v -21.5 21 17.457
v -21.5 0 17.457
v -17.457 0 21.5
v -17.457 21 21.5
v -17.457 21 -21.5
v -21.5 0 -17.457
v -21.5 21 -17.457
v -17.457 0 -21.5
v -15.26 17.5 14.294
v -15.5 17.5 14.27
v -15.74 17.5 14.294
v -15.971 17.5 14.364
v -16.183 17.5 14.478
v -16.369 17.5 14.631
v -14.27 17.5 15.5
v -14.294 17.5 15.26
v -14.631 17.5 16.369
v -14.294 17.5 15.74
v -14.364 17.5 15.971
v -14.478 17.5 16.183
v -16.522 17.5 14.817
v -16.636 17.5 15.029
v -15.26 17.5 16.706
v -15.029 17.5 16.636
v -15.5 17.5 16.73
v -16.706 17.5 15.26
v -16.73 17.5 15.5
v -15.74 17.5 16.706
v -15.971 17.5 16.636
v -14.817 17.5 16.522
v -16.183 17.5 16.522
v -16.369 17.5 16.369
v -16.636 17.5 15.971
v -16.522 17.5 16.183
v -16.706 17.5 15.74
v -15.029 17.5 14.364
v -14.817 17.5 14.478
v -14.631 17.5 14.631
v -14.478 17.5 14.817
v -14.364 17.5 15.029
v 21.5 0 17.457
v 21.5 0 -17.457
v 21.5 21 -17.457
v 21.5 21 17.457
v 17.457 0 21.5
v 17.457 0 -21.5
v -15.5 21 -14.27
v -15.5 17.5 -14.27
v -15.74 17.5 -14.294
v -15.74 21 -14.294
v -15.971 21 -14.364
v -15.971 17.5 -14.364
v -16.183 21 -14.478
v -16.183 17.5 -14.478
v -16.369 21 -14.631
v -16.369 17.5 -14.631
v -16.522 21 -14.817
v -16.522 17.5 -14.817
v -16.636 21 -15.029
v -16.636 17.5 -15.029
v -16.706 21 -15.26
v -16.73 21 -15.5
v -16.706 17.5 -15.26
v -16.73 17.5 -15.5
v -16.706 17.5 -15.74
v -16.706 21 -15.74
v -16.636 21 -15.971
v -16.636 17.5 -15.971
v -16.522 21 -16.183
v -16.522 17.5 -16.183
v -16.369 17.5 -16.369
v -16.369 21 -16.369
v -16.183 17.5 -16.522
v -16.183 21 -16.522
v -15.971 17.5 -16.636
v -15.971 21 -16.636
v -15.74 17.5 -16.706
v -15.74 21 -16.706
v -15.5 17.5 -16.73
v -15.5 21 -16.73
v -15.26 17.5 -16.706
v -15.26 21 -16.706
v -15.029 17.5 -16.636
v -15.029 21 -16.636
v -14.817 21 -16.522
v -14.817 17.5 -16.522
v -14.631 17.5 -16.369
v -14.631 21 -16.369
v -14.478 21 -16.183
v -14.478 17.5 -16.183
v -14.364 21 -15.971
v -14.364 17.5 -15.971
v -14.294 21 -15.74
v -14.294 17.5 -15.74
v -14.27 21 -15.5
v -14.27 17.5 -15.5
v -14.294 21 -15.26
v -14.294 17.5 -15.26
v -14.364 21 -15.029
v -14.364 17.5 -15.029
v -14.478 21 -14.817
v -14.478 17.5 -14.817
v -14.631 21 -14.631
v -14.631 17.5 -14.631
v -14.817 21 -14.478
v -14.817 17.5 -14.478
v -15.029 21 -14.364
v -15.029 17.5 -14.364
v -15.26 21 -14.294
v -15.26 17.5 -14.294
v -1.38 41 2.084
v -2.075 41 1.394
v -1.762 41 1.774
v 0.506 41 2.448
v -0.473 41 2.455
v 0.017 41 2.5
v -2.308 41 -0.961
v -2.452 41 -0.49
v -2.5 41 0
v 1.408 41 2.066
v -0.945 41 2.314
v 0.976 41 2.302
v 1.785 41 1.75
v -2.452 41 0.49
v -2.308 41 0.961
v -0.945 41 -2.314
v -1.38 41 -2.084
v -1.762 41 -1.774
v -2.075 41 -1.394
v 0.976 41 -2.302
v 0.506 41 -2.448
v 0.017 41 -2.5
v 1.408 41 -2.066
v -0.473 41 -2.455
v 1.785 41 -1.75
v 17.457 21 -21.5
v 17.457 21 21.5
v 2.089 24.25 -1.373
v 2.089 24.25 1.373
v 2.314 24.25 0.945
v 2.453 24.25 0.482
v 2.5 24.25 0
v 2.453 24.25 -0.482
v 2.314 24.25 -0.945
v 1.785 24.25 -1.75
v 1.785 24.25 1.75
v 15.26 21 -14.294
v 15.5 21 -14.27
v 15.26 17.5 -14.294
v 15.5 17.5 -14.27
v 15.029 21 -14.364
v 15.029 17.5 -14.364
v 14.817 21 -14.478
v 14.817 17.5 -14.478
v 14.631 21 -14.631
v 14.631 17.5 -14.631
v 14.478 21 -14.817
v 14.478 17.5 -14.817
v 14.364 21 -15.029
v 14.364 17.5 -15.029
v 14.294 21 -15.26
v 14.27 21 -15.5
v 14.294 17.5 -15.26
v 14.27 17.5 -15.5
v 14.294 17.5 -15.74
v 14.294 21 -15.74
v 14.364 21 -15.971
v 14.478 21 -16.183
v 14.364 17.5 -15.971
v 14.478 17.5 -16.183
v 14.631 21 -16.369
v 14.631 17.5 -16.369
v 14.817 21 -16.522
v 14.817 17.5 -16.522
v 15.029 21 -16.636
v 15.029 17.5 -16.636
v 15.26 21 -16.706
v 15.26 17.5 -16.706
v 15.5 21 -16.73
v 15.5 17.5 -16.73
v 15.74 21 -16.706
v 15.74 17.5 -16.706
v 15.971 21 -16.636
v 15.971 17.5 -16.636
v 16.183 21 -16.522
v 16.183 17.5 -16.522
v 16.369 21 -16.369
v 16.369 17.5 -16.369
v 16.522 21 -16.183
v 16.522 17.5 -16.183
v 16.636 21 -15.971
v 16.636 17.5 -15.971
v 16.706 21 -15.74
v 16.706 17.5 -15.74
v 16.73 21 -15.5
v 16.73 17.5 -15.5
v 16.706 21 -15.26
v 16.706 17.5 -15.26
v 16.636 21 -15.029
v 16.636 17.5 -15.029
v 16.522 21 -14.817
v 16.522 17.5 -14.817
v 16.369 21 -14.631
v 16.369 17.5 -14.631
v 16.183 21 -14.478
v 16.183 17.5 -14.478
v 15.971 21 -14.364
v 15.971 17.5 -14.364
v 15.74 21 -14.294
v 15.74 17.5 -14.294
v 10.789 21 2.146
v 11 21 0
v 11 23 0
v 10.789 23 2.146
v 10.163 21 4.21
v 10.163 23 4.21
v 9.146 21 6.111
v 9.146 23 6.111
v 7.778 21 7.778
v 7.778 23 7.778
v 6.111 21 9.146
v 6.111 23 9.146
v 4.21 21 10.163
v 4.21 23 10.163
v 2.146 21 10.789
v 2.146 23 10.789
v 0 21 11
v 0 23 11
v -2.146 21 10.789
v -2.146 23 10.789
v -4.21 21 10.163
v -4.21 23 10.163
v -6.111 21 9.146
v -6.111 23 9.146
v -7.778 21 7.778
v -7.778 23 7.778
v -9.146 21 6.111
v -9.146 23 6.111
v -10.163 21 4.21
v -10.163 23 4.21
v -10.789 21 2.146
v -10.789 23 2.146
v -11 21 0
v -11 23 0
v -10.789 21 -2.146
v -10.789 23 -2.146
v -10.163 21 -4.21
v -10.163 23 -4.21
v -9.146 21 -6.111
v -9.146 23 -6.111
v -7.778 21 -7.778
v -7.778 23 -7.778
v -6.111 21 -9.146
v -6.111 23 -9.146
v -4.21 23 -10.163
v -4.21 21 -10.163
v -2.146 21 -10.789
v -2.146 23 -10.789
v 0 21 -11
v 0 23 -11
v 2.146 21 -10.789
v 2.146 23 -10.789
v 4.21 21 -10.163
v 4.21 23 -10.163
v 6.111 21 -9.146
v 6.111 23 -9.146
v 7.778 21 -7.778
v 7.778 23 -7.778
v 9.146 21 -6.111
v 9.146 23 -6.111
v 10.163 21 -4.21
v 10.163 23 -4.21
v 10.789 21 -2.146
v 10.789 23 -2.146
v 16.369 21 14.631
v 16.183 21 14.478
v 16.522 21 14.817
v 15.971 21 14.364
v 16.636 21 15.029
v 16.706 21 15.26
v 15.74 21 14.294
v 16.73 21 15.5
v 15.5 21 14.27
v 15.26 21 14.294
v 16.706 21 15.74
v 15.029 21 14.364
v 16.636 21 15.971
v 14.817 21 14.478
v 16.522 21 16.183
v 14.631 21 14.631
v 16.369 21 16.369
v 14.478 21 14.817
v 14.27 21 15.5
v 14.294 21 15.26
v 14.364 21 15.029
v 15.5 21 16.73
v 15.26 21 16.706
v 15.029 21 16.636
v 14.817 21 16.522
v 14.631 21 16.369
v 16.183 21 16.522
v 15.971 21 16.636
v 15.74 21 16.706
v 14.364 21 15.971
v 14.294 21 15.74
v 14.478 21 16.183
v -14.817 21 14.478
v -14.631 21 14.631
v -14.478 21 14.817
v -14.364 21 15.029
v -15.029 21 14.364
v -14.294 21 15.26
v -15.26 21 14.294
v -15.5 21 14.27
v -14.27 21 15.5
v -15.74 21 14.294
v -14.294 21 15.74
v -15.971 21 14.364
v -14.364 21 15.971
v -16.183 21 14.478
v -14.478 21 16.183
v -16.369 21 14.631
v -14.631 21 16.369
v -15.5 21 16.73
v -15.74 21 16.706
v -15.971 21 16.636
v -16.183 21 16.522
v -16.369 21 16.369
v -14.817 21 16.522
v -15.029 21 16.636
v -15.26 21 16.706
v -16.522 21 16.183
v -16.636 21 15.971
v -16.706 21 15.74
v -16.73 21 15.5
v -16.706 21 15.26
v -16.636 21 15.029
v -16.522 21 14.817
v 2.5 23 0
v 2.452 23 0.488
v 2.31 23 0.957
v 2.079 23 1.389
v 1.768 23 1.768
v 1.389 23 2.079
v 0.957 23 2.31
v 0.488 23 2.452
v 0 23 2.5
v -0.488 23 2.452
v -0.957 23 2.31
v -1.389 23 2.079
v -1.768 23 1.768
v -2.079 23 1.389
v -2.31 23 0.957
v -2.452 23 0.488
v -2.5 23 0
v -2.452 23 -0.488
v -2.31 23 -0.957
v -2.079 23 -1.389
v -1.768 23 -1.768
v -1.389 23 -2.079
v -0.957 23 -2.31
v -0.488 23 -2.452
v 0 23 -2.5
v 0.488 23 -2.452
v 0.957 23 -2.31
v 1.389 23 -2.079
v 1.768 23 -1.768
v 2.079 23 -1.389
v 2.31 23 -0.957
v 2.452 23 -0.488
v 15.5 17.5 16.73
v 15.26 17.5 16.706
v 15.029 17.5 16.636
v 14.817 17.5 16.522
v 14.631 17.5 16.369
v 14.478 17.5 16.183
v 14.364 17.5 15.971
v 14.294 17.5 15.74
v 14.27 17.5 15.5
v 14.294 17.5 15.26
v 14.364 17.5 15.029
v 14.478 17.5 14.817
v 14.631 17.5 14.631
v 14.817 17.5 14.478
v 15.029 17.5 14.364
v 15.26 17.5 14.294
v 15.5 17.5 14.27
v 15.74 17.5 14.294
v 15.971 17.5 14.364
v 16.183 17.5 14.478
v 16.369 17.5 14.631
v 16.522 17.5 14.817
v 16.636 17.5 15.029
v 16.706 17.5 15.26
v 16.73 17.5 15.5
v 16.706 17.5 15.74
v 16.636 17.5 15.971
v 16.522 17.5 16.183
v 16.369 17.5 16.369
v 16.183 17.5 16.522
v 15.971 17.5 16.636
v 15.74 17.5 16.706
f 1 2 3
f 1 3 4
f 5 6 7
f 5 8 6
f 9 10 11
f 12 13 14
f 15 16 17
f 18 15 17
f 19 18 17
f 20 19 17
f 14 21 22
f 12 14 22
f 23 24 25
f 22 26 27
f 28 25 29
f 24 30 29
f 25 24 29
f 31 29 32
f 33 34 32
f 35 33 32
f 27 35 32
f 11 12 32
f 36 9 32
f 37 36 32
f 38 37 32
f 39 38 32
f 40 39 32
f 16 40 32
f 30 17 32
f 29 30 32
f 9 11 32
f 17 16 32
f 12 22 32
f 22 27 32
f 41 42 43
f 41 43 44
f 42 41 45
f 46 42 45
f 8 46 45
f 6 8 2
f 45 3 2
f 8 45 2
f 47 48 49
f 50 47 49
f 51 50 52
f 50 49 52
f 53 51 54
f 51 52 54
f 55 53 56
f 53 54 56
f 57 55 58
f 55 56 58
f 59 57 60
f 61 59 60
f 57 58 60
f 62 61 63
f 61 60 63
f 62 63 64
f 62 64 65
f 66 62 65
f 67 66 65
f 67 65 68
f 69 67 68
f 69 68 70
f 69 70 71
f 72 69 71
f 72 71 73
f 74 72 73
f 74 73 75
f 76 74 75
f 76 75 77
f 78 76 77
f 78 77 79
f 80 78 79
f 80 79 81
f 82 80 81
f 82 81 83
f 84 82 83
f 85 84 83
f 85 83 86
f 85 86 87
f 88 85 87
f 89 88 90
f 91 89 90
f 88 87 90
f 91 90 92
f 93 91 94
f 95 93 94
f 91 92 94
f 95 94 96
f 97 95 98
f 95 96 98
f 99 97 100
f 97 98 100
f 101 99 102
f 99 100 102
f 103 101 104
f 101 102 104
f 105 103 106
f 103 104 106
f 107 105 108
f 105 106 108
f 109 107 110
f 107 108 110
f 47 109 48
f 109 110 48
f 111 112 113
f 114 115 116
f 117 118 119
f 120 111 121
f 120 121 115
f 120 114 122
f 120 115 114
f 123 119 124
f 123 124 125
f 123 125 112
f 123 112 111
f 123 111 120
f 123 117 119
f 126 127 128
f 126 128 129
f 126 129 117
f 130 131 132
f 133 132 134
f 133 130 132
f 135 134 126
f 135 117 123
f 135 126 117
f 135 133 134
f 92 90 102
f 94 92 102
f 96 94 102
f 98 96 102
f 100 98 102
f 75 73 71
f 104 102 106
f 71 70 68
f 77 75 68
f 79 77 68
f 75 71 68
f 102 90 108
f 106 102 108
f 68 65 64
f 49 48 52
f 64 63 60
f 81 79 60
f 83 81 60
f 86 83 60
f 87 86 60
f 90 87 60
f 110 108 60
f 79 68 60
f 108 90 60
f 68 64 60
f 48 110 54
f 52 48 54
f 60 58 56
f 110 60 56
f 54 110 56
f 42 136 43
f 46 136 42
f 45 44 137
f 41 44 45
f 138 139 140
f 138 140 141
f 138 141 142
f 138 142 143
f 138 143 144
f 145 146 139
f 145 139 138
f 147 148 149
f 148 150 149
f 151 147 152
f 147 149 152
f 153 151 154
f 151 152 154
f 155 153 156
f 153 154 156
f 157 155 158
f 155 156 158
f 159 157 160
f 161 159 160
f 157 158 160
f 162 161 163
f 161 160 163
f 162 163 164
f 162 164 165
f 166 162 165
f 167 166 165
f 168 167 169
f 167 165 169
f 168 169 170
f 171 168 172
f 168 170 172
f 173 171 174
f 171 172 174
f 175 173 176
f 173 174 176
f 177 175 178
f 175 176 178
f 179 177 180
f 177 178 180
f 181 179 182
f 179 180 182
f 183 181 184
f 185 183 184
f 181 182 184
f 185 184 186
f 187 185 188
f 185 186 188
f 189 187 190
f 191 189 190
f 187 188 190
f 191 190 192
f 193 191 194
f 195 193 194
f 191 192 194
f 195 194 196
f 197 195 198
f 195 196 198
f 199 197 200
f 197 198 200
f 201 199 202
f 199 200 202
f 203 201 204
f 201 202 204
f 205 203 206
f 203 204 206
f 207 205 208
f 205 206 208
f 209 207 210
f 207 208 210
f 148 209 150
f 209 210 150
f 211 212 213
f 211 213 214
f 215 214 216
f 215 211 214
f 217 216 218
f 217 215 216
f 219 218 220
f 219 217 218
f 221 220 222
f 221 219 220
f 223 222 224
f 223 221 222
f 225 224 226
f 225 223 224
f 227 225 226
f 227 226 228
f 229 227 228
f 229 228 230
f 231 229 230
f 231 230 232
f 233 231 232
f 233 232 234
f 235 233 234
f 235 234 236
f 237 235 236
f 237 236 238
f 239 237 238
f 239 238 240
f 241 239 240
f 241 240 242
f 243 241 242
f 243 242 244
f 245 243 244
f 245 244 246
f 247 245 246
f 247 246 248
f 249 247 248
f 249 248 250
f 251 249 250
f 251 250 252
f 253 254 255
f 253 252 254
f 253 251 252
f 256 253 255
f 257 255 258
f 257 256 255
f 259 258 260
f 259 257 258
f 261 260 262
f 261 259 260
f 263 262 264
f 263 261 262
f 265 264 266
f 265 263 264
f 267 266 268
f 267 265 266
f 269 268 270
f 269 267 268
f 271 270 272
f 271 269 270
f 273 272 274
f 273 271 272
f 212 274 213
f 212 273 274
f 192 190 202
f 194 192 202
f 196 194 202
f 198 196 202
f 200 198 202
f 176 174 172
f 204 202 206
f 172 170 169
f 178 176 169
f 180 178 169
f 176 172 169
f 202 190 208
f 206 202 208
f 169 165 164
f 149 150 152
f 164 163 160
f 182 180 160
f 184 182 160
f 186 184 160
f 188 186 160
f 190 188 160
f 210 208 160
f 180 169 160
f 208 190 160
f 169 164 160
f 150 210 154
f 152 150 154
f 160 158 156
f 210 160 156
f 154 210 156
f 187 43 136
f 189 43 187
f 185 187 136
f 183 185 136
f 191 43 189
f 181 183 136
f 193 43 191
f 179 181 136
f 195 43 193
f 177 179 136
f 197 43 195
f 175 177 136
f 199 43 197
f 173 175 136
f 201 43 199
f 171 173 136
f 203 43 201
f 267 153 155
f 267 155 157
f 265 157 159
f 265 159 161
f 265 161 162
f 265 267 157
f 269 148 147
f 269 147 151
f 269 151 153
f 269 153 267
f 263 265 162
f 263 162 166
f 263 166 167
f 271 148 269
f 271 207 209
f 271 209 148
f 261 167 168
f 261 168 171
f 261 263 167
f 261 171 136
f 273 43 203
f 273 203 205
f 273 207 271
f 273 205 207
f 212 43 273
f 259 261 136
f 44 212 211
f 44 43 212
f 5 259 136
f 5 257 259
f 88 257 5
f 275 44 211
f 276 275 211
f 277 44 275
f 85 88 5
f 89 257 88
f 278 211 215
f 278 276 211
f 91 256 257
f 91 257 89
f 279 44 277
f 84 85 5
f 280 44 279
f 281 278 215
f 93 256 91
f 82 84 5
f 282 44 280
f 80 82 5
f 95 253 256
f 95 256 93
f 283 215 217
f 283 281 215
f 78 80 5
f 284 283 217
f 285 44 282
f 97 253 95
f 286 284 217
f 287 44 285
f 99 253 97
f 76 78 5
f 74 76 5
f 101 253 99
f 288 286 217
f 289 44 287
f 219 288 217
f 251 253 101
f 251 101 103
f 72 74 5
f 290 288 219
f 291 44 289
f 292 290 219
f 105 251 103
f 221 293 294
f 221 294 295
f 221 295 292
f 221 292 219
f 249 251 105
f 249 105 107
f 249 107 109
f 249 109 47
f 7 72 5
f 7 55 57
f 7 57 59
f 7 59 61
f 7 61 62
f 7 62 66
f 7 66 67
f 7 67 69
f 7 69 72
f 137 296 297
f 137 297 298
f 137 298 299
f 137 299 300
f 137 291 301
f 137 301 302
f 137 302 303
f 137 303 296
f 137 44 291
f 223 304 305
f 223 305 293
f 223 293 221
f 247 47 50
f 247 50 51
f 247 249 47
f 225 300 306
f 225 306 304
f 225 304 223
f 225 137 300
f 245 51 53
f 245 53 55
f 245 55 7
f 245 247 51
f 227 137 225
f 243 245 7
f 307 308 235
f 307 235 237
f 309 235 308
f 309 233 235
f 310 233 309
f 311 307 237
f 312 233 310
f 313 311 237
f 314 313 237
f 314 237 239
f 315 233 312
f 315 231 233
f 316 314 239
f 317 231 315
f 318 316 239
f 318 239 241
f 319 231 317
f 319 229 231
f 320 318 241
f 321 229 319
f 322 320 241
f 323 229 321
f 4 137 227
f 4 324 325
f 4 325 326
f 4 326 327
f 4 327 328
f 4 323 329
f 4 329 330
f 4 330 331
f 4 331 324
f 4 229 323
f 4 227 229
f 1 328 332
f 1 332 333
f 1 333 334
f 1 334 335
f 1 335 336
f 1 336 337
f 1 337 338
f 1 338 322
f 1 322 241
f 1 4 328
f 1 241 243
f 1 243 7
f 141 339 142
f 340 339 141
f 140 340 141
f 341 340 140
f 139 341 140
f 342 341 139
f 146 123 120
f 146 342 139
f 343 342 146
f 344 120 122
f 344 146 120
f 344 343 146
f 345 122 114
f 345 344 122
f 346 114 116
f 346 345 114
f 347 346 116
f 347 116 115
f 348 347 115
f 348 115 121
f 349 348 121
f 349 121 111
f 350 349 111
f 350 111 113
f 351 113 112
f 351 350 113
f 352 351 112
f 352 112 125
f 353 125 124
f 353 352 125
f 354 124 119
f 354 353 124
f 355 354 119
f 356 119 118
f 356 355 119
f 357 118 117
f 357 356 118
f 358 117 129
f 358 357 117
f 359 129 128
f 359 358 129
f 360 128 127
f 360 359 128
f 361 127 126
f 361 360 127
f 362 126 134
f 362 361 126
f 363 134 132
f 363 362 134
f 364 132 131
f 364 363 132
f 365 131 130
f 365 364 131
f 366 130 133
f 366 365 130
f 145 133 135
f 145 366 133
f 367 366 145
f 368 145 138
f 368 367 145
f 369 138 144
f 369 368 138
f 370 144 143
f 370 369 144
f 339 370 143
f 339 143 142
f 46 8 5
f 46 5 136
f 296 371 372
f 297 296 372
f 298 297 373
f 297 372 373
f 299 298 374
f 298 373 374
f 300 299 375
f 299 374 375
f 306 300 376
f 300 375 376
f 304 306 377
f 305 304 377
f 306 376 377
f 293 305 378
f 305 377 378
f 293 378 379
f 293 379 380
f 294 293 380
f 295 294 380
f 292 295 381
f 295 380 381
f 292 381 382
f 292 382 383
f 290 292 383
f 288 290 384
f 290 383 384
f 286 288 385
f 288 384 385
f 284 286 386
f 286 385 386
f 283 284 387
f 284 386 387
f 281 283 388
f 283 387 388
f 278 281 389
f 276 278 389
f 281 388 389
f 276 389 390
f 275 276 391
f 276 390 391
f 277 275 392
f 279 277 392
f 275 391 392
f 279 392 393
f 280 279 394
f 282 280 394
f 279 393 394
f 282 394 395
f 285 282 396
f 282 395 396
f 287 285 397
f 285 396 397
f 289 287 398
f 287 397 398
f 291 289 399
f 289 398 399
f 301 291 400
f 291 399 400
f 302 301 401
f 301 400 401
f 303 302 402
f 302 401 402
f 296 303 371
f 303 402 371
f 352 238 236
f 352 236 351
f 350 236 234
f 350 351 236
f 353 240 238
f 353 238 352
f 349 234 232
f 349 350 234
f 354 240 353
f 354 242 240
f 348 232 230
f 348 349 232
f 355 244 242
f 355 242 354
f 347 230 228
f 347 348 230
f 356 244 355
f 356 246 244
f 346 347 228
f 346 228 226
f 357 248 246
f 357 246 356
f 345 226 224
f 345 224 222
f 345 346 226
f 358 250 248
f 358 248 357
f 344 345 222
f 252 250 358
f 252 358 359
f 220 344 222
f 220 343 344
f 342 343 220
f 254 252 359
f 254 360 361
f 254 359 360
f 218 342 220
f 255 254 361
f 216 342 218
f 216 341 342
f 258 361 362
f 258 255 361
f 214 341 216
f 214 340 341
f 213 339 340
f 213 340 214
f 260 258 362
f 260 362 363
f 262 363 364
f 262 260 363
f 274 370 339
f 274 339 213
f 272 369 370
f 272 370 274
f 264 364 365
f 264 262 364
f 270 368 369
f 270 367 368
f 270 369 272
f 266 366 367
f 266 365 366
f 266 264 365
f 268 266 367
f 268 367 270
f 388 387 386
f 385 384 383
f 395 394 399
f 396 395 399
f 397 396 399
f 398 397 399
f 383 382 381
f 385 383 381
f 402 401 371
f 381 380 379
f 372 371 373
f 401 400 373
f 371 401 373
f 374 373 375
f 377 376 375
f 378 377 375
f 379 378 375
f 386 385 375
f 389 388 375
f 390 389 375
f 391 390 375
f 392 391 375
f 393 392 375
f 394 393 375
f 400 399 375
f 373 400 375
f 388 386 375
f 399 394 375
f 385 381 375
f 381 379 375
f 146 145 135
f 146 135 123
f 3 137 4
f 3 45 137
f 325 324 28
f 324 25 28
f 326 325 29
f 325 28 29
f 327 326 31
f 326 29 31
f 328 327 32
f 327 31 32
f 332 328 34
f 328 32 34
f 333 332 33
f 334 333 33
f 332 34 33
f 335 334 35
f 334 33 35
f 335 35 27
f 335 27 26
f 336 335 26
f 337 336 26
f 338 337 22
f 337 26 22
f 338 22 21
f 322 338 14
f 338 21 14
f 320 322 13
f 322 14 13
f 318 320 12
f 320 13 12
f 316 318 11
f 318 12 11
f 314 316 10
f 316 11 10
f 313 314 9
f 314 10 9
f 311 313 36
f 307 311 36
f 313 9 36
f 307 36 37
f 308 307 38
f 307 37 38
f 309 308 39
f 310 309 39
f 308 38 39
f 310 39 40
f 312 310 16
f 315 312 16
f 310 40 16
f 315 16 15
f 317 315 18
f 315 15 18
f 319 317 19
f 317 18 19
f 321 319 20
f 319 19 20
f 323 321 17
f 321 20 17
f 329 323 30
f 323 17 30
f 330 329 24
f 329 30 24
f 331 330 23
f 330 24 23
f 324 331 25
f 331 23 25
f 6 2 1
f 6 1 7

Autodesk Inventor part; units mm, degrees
ref_plane "YZ Plane" through (0, 0, 0) normal (1, 0, 0) x (0, 1, 0)
ref_plane "XZ Plane" through (0, 0, 0) normal (0, 1, 0) x (-1, 0, 0)
ref_plane "XY Plane" through (0, 0, 0) normal (0, 0, 1) x (1, 0, 0)
sketch "Sketch1" plane through (0, 0, 0) normal (0, 1, 0) x (-1, 0, 0)
  line L0 (-21.5, 21.5) -> (21.5, 21.5)
  line L1 (21.5, 21.5) -> (21.5, -21.5)
  line L2 (21.5, -21.5) -> (-21.5, -21.5)
  line L3 (-21.5, -21.5) -> (-21.5, 21.5)
  line L4 (-21.5, 21.5) -> (21.5, -21.5) construction
  line L5 (21.5, 21.5) -> (-21.5, -21.5) construction
  point P0 (0, 0)
  dimension "d0" = 43
  dimension "d1" = 43
extrude "Extrusion1" add sketch "Sketch1" along normal blind 21
sketch "Sketch2" plane through (0, 21, 0) normal (0, 1, 0) x (1, 0, 0)
  line L0 (21.5, 21.5) -> (-21.5, 21.5) construction
  line L1 (-21.5, 21.5) -> (-21.5, -21.5) construction
  line L2 (-21.5, -21.5) -> (21.5, -21.5) construction
  line L3 (21.5, -21.5) -> (21.5, 21.5) construction
  line L4 (21.5, -21.5) -> (-21.5, 21.5) construction
  line L5 (21.5, 21.5) -> (-21.5, -21.5) construction
  circle A0 centre (0, 0) radius 11
  dimension "d4" = 22
extrude "Extrusion2" add sketch "Sketch2" along normal blind 2
sketch "Sketch3" plane through (0, 23, 0) normal (0, 1, 0) x (1, 0, 0)
  circle A0 centre (0, 0) radius 11 construction
  circle A1 centre (0, 0) radius 11 construction
  circle A2 centre (0, 0) radius 2.5
  dimension "d7" = 5
extrude "Extrusion3" add sketch "Sketch3" along normal blind 18
sketch "Sketch4" plane through (0, 41, 0) normal (0, 1, 0) x (1, 0, 0)
  circle A0 centre (0, 0) radius 2.5 projected
  line L0 (1.7854, 1.75) -> (1.7854, -1.75)
  dimension "d11" = 3.5
extrude "Extrusion4" cut sketch "Sketch4" against normal blind 16.75 contours A0 L0 picked at (1.8866, -0.4578)
chamfer "Chamfer1" distance 4.0426 angle 45 4 edges at (-21.5, 10.5, 21.5) (21.5, 10.5, 21.5) (21.5, 10.5, -21.5) (-21.5, 10.5, -21.5)
sketch "Sketch5" plane through (0, 21, 0) normal (0, 1, 0) x (1, 0, 0)
  line L0 (-21.5, 17.4574) -> (-17.4574, 21.5) construction
  line L1 (-21.5, 17.4574) -> (-21.5, -17.4574) construction
  line L2 (-17.4574, -21.5) -> (-21.5, -17.4574) construction
  line L3 (-17.4574, -21.5) -> (17.4574, -21.5) construction
  line L4 (21.5, -17.4574) -> (17.4574, -21.5) construction
  line L5 (21.5, -17.4574) -> (21.5, 17.4574) construction
  line L6 (17.4574, 21.5) -> (21.5, 17.4574) construction
  line L7 (17.4574, 21.5) -> (-17.4574, 21.5) construction
  circle A0 centre (0, 0) radius 11 construction
  line L8 (15.5, -15.5) -> (-15.5, -15.5) construction
  line L9 (-15.5, -15.5) -> (-15.5, 15.5) construction
  line L10 (-15.5, 15.5) -> (15.5, 15.5) construction
  line L11 (15.5, 15.5) -> (15.5, -15.5) construction
  circle A1 centre (0, 0) radius 2.5 construction
  line L12 (15.5, -15.5) -> (-15.5, 15.5) construction
  line L13 (-15.5, -15.5) -> (15.5, 15.5) construction
  dimension "d17" = 31
  dimension "d18" = 31
hole "Hole1" at (-15.5, 21, 15.5) at (-15.5, 21, -15.5) at (15.5, 21, -15.5) at (15.5, 21, 15.5) direction (0, -1, 0) diameter 2.459 depth 3.5 thread size "M3x0.5" class "6H" standard "ISO Metric profile"
properties part number "PancakeStepper" material "Steel, Carbon"
